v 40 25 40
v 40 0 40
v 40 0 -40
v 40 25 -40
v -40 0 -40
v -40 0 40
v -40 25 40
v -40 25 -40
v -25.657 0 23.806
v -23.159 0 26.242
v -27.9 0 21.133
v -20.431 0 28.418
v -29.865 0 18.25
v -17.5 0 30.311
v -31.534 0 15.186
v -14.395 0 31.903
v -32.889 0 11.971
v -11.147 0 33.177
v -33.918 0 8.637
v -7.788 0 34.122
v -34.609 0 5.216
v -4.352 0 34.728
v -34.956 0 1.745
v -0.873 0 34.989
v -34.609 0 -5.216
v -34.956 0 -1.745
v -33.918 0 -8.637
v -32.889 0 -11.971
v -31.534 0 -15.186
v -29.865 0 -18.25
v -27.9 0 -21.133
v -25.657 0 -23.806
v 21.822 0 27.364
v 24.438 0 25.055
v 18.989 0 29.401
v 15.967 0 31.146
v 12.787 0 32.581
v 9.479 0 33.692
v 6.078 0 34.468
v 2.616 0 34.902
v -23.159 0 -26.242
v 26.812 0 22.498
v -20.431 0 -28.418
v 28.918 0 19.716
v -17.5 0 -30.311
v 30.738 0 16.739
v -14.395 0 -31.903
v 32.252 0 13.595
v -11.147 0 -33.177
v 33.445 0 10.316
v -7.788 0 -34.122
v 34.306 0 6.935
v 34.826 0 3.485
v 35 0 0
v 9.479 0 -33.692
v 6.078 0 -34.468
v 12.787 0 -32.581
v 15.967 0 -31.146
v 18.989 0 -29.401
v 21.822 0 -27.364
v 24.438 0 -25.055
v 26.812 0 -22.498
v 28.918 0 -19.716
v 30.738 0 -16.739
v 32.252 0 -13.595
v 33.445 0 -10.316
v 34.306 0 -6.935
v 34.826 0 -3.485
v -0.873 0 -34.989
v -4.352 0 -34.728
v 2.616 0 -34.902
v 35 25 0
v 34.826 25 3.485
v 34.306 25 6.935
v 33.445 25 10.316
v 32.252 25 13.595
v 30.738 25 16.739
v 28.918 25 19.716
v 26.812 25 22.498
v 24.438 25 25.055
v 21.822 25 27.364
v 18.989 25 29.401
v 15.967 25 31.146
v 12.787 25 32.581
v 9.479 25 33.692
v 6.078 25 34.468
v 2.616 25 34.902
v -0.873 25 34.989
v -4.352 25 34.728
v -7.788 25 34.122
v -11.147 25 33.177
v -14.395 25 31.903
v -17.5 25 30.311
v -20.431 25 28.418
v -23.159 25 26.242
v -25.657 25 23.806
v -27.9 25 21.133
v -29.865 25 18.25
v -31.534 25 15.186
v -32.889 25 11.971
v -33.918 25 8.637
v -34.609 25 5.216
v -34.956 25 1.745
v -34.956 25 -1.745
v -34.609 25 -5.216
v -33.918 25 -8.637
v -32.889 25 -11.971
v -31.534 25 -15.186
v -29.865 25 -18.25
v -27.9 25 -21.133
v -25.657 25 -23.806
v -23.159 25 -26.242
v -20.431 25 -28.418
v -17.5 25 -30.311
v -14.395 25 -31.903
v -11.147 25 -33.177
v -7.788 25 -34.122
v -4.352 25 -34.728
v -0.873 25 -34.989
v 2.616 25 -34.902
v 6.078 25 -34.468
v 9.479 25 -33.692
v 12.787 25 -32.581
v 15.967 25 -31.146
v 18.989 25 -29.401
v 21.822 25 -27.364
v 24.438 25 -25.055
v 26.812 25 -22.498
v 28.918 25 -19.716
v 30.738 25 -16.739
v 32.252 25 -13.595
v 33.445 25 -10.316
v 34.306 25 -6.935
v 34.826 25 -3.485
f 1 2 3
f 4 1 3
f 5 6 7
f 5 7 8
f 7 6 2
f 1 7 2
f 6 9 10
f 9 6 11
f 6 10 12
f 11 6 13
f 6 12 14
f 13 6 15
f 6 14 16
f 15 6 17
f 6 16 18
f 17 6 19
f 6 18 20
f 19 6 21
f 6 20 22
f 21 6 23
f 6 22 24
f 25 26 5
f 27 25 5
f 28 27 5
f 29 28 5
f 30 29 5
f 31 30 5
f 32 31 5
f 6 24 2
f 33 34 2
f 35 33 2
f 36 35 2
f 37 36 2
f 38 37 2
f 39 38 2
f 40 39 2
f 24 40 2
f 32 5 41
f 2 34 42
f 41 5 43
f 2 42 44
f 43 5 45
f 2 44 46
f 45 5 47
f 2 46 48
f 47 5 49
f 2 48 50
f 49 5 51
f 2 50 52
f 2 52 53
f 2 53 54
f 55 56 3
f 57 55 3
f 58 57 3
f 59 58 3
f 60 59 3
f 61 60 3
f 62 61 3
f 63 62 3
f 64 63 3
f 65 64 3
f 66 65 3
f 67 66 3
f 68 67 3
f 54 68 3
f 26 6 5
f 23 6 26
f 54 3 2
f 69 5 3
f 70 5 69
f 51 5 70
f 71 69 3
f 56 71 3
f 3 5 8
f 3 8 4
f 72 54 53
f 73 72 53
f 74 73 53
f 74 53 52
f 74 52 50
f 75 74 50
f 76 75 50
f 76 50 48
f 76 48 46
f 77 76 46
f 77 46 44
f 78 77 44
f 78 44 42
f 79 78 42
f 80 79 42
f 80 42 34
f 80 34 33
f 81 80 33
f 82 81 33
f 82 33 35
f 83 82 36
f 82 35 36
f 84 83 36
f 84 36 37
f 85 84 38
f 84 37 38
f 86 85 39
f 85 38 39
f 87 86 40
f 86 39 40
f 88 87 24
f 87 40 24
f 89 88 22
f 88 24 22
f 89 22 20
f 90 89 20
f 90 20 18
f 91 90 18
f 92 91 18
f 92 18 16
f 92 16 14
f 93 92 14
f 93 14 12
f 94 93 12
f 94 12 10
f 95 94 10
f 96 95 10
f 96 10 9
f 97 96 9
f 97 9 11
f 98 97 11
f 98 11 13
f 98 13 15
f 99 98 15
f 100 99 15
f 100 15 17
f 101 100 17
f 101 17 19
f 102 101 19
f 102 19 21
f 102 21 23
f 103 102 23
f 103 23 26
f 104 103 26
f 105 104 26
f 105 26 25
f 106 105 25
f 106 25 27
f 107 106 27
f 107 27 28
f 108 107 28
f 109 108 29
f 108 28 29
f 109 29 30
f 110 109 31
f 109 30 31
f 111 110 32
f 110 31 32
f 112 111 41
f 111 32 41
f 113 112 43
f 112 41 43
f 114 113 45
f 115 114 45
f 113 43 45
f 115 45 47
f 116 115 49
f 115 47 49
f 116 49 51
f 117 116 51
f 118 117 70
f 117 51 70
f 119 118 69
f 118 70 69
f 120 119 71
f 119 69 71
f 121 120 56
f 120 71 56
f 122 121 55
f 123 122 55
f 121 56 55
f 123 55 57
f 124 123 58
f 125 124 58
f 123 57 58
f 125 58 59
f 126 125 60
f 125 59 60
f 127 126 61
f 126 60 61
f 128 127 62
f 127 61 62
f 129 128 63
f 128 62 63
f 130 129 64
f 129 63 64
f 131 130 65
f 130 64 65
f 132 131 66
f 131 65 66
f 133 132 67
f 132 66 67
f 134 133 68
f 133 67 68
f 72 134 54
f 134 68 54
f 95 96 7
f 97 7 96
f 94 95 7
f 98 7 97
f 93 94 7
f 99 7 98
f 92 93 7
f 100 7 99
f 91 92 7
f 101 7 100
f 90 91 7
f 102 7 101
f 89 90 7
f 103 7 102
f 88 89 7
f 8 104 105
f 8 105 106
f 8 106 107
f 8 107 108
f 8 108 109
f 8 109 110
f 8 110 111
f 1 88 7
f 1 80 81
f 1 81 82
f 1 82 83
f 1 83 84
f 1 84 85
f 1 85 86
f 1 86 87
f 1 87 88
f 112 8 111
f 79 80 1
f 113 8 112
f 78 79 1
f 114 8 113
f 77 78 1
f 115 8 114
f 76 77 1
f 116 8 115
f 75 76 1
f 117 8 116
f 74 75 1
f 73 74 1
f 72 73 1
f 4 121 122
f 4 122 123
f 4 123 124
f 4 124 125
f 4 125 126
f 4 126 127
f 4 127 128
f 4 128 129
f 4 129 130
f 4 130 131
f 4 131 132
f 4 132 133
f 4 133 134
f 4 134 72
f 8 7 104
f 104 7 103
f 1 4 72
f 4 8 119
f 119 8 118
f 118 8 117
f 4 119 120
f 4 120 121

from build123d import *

# Parameters (mm, degrees)
SKETCH1_W           = 80
SKETCH1_H           = 80
BOSS_EXTRUDE1_DEPTH = 25
SKETCH2_R           = 35
CUT_EXTRUDE1_DEPTH  = 26


with BuildPart() as part:
    # Sketch1 → Boss-Extrude1 (new body)
    with BuildSketch(Plane(origin=(0, 0, 0), x_dir=(1, 0, 0), z_dir=(0, 1, 0))):
        Rectangle(SKETCH1_W, SKETCH1_H)
    extrude(amount=BOSS_EXTRUDE1_DEPTH)

    # Sketch2 → Cut-Extrude1 (cut, through all)
    with BuildSketch(Plane.XZ):
        Circle(SKETCH2_R)
    extrude(amount=-CUT_EXTRUDE1_DEPTH, mode=Mode.SUBTRACT)


solid = part.part
